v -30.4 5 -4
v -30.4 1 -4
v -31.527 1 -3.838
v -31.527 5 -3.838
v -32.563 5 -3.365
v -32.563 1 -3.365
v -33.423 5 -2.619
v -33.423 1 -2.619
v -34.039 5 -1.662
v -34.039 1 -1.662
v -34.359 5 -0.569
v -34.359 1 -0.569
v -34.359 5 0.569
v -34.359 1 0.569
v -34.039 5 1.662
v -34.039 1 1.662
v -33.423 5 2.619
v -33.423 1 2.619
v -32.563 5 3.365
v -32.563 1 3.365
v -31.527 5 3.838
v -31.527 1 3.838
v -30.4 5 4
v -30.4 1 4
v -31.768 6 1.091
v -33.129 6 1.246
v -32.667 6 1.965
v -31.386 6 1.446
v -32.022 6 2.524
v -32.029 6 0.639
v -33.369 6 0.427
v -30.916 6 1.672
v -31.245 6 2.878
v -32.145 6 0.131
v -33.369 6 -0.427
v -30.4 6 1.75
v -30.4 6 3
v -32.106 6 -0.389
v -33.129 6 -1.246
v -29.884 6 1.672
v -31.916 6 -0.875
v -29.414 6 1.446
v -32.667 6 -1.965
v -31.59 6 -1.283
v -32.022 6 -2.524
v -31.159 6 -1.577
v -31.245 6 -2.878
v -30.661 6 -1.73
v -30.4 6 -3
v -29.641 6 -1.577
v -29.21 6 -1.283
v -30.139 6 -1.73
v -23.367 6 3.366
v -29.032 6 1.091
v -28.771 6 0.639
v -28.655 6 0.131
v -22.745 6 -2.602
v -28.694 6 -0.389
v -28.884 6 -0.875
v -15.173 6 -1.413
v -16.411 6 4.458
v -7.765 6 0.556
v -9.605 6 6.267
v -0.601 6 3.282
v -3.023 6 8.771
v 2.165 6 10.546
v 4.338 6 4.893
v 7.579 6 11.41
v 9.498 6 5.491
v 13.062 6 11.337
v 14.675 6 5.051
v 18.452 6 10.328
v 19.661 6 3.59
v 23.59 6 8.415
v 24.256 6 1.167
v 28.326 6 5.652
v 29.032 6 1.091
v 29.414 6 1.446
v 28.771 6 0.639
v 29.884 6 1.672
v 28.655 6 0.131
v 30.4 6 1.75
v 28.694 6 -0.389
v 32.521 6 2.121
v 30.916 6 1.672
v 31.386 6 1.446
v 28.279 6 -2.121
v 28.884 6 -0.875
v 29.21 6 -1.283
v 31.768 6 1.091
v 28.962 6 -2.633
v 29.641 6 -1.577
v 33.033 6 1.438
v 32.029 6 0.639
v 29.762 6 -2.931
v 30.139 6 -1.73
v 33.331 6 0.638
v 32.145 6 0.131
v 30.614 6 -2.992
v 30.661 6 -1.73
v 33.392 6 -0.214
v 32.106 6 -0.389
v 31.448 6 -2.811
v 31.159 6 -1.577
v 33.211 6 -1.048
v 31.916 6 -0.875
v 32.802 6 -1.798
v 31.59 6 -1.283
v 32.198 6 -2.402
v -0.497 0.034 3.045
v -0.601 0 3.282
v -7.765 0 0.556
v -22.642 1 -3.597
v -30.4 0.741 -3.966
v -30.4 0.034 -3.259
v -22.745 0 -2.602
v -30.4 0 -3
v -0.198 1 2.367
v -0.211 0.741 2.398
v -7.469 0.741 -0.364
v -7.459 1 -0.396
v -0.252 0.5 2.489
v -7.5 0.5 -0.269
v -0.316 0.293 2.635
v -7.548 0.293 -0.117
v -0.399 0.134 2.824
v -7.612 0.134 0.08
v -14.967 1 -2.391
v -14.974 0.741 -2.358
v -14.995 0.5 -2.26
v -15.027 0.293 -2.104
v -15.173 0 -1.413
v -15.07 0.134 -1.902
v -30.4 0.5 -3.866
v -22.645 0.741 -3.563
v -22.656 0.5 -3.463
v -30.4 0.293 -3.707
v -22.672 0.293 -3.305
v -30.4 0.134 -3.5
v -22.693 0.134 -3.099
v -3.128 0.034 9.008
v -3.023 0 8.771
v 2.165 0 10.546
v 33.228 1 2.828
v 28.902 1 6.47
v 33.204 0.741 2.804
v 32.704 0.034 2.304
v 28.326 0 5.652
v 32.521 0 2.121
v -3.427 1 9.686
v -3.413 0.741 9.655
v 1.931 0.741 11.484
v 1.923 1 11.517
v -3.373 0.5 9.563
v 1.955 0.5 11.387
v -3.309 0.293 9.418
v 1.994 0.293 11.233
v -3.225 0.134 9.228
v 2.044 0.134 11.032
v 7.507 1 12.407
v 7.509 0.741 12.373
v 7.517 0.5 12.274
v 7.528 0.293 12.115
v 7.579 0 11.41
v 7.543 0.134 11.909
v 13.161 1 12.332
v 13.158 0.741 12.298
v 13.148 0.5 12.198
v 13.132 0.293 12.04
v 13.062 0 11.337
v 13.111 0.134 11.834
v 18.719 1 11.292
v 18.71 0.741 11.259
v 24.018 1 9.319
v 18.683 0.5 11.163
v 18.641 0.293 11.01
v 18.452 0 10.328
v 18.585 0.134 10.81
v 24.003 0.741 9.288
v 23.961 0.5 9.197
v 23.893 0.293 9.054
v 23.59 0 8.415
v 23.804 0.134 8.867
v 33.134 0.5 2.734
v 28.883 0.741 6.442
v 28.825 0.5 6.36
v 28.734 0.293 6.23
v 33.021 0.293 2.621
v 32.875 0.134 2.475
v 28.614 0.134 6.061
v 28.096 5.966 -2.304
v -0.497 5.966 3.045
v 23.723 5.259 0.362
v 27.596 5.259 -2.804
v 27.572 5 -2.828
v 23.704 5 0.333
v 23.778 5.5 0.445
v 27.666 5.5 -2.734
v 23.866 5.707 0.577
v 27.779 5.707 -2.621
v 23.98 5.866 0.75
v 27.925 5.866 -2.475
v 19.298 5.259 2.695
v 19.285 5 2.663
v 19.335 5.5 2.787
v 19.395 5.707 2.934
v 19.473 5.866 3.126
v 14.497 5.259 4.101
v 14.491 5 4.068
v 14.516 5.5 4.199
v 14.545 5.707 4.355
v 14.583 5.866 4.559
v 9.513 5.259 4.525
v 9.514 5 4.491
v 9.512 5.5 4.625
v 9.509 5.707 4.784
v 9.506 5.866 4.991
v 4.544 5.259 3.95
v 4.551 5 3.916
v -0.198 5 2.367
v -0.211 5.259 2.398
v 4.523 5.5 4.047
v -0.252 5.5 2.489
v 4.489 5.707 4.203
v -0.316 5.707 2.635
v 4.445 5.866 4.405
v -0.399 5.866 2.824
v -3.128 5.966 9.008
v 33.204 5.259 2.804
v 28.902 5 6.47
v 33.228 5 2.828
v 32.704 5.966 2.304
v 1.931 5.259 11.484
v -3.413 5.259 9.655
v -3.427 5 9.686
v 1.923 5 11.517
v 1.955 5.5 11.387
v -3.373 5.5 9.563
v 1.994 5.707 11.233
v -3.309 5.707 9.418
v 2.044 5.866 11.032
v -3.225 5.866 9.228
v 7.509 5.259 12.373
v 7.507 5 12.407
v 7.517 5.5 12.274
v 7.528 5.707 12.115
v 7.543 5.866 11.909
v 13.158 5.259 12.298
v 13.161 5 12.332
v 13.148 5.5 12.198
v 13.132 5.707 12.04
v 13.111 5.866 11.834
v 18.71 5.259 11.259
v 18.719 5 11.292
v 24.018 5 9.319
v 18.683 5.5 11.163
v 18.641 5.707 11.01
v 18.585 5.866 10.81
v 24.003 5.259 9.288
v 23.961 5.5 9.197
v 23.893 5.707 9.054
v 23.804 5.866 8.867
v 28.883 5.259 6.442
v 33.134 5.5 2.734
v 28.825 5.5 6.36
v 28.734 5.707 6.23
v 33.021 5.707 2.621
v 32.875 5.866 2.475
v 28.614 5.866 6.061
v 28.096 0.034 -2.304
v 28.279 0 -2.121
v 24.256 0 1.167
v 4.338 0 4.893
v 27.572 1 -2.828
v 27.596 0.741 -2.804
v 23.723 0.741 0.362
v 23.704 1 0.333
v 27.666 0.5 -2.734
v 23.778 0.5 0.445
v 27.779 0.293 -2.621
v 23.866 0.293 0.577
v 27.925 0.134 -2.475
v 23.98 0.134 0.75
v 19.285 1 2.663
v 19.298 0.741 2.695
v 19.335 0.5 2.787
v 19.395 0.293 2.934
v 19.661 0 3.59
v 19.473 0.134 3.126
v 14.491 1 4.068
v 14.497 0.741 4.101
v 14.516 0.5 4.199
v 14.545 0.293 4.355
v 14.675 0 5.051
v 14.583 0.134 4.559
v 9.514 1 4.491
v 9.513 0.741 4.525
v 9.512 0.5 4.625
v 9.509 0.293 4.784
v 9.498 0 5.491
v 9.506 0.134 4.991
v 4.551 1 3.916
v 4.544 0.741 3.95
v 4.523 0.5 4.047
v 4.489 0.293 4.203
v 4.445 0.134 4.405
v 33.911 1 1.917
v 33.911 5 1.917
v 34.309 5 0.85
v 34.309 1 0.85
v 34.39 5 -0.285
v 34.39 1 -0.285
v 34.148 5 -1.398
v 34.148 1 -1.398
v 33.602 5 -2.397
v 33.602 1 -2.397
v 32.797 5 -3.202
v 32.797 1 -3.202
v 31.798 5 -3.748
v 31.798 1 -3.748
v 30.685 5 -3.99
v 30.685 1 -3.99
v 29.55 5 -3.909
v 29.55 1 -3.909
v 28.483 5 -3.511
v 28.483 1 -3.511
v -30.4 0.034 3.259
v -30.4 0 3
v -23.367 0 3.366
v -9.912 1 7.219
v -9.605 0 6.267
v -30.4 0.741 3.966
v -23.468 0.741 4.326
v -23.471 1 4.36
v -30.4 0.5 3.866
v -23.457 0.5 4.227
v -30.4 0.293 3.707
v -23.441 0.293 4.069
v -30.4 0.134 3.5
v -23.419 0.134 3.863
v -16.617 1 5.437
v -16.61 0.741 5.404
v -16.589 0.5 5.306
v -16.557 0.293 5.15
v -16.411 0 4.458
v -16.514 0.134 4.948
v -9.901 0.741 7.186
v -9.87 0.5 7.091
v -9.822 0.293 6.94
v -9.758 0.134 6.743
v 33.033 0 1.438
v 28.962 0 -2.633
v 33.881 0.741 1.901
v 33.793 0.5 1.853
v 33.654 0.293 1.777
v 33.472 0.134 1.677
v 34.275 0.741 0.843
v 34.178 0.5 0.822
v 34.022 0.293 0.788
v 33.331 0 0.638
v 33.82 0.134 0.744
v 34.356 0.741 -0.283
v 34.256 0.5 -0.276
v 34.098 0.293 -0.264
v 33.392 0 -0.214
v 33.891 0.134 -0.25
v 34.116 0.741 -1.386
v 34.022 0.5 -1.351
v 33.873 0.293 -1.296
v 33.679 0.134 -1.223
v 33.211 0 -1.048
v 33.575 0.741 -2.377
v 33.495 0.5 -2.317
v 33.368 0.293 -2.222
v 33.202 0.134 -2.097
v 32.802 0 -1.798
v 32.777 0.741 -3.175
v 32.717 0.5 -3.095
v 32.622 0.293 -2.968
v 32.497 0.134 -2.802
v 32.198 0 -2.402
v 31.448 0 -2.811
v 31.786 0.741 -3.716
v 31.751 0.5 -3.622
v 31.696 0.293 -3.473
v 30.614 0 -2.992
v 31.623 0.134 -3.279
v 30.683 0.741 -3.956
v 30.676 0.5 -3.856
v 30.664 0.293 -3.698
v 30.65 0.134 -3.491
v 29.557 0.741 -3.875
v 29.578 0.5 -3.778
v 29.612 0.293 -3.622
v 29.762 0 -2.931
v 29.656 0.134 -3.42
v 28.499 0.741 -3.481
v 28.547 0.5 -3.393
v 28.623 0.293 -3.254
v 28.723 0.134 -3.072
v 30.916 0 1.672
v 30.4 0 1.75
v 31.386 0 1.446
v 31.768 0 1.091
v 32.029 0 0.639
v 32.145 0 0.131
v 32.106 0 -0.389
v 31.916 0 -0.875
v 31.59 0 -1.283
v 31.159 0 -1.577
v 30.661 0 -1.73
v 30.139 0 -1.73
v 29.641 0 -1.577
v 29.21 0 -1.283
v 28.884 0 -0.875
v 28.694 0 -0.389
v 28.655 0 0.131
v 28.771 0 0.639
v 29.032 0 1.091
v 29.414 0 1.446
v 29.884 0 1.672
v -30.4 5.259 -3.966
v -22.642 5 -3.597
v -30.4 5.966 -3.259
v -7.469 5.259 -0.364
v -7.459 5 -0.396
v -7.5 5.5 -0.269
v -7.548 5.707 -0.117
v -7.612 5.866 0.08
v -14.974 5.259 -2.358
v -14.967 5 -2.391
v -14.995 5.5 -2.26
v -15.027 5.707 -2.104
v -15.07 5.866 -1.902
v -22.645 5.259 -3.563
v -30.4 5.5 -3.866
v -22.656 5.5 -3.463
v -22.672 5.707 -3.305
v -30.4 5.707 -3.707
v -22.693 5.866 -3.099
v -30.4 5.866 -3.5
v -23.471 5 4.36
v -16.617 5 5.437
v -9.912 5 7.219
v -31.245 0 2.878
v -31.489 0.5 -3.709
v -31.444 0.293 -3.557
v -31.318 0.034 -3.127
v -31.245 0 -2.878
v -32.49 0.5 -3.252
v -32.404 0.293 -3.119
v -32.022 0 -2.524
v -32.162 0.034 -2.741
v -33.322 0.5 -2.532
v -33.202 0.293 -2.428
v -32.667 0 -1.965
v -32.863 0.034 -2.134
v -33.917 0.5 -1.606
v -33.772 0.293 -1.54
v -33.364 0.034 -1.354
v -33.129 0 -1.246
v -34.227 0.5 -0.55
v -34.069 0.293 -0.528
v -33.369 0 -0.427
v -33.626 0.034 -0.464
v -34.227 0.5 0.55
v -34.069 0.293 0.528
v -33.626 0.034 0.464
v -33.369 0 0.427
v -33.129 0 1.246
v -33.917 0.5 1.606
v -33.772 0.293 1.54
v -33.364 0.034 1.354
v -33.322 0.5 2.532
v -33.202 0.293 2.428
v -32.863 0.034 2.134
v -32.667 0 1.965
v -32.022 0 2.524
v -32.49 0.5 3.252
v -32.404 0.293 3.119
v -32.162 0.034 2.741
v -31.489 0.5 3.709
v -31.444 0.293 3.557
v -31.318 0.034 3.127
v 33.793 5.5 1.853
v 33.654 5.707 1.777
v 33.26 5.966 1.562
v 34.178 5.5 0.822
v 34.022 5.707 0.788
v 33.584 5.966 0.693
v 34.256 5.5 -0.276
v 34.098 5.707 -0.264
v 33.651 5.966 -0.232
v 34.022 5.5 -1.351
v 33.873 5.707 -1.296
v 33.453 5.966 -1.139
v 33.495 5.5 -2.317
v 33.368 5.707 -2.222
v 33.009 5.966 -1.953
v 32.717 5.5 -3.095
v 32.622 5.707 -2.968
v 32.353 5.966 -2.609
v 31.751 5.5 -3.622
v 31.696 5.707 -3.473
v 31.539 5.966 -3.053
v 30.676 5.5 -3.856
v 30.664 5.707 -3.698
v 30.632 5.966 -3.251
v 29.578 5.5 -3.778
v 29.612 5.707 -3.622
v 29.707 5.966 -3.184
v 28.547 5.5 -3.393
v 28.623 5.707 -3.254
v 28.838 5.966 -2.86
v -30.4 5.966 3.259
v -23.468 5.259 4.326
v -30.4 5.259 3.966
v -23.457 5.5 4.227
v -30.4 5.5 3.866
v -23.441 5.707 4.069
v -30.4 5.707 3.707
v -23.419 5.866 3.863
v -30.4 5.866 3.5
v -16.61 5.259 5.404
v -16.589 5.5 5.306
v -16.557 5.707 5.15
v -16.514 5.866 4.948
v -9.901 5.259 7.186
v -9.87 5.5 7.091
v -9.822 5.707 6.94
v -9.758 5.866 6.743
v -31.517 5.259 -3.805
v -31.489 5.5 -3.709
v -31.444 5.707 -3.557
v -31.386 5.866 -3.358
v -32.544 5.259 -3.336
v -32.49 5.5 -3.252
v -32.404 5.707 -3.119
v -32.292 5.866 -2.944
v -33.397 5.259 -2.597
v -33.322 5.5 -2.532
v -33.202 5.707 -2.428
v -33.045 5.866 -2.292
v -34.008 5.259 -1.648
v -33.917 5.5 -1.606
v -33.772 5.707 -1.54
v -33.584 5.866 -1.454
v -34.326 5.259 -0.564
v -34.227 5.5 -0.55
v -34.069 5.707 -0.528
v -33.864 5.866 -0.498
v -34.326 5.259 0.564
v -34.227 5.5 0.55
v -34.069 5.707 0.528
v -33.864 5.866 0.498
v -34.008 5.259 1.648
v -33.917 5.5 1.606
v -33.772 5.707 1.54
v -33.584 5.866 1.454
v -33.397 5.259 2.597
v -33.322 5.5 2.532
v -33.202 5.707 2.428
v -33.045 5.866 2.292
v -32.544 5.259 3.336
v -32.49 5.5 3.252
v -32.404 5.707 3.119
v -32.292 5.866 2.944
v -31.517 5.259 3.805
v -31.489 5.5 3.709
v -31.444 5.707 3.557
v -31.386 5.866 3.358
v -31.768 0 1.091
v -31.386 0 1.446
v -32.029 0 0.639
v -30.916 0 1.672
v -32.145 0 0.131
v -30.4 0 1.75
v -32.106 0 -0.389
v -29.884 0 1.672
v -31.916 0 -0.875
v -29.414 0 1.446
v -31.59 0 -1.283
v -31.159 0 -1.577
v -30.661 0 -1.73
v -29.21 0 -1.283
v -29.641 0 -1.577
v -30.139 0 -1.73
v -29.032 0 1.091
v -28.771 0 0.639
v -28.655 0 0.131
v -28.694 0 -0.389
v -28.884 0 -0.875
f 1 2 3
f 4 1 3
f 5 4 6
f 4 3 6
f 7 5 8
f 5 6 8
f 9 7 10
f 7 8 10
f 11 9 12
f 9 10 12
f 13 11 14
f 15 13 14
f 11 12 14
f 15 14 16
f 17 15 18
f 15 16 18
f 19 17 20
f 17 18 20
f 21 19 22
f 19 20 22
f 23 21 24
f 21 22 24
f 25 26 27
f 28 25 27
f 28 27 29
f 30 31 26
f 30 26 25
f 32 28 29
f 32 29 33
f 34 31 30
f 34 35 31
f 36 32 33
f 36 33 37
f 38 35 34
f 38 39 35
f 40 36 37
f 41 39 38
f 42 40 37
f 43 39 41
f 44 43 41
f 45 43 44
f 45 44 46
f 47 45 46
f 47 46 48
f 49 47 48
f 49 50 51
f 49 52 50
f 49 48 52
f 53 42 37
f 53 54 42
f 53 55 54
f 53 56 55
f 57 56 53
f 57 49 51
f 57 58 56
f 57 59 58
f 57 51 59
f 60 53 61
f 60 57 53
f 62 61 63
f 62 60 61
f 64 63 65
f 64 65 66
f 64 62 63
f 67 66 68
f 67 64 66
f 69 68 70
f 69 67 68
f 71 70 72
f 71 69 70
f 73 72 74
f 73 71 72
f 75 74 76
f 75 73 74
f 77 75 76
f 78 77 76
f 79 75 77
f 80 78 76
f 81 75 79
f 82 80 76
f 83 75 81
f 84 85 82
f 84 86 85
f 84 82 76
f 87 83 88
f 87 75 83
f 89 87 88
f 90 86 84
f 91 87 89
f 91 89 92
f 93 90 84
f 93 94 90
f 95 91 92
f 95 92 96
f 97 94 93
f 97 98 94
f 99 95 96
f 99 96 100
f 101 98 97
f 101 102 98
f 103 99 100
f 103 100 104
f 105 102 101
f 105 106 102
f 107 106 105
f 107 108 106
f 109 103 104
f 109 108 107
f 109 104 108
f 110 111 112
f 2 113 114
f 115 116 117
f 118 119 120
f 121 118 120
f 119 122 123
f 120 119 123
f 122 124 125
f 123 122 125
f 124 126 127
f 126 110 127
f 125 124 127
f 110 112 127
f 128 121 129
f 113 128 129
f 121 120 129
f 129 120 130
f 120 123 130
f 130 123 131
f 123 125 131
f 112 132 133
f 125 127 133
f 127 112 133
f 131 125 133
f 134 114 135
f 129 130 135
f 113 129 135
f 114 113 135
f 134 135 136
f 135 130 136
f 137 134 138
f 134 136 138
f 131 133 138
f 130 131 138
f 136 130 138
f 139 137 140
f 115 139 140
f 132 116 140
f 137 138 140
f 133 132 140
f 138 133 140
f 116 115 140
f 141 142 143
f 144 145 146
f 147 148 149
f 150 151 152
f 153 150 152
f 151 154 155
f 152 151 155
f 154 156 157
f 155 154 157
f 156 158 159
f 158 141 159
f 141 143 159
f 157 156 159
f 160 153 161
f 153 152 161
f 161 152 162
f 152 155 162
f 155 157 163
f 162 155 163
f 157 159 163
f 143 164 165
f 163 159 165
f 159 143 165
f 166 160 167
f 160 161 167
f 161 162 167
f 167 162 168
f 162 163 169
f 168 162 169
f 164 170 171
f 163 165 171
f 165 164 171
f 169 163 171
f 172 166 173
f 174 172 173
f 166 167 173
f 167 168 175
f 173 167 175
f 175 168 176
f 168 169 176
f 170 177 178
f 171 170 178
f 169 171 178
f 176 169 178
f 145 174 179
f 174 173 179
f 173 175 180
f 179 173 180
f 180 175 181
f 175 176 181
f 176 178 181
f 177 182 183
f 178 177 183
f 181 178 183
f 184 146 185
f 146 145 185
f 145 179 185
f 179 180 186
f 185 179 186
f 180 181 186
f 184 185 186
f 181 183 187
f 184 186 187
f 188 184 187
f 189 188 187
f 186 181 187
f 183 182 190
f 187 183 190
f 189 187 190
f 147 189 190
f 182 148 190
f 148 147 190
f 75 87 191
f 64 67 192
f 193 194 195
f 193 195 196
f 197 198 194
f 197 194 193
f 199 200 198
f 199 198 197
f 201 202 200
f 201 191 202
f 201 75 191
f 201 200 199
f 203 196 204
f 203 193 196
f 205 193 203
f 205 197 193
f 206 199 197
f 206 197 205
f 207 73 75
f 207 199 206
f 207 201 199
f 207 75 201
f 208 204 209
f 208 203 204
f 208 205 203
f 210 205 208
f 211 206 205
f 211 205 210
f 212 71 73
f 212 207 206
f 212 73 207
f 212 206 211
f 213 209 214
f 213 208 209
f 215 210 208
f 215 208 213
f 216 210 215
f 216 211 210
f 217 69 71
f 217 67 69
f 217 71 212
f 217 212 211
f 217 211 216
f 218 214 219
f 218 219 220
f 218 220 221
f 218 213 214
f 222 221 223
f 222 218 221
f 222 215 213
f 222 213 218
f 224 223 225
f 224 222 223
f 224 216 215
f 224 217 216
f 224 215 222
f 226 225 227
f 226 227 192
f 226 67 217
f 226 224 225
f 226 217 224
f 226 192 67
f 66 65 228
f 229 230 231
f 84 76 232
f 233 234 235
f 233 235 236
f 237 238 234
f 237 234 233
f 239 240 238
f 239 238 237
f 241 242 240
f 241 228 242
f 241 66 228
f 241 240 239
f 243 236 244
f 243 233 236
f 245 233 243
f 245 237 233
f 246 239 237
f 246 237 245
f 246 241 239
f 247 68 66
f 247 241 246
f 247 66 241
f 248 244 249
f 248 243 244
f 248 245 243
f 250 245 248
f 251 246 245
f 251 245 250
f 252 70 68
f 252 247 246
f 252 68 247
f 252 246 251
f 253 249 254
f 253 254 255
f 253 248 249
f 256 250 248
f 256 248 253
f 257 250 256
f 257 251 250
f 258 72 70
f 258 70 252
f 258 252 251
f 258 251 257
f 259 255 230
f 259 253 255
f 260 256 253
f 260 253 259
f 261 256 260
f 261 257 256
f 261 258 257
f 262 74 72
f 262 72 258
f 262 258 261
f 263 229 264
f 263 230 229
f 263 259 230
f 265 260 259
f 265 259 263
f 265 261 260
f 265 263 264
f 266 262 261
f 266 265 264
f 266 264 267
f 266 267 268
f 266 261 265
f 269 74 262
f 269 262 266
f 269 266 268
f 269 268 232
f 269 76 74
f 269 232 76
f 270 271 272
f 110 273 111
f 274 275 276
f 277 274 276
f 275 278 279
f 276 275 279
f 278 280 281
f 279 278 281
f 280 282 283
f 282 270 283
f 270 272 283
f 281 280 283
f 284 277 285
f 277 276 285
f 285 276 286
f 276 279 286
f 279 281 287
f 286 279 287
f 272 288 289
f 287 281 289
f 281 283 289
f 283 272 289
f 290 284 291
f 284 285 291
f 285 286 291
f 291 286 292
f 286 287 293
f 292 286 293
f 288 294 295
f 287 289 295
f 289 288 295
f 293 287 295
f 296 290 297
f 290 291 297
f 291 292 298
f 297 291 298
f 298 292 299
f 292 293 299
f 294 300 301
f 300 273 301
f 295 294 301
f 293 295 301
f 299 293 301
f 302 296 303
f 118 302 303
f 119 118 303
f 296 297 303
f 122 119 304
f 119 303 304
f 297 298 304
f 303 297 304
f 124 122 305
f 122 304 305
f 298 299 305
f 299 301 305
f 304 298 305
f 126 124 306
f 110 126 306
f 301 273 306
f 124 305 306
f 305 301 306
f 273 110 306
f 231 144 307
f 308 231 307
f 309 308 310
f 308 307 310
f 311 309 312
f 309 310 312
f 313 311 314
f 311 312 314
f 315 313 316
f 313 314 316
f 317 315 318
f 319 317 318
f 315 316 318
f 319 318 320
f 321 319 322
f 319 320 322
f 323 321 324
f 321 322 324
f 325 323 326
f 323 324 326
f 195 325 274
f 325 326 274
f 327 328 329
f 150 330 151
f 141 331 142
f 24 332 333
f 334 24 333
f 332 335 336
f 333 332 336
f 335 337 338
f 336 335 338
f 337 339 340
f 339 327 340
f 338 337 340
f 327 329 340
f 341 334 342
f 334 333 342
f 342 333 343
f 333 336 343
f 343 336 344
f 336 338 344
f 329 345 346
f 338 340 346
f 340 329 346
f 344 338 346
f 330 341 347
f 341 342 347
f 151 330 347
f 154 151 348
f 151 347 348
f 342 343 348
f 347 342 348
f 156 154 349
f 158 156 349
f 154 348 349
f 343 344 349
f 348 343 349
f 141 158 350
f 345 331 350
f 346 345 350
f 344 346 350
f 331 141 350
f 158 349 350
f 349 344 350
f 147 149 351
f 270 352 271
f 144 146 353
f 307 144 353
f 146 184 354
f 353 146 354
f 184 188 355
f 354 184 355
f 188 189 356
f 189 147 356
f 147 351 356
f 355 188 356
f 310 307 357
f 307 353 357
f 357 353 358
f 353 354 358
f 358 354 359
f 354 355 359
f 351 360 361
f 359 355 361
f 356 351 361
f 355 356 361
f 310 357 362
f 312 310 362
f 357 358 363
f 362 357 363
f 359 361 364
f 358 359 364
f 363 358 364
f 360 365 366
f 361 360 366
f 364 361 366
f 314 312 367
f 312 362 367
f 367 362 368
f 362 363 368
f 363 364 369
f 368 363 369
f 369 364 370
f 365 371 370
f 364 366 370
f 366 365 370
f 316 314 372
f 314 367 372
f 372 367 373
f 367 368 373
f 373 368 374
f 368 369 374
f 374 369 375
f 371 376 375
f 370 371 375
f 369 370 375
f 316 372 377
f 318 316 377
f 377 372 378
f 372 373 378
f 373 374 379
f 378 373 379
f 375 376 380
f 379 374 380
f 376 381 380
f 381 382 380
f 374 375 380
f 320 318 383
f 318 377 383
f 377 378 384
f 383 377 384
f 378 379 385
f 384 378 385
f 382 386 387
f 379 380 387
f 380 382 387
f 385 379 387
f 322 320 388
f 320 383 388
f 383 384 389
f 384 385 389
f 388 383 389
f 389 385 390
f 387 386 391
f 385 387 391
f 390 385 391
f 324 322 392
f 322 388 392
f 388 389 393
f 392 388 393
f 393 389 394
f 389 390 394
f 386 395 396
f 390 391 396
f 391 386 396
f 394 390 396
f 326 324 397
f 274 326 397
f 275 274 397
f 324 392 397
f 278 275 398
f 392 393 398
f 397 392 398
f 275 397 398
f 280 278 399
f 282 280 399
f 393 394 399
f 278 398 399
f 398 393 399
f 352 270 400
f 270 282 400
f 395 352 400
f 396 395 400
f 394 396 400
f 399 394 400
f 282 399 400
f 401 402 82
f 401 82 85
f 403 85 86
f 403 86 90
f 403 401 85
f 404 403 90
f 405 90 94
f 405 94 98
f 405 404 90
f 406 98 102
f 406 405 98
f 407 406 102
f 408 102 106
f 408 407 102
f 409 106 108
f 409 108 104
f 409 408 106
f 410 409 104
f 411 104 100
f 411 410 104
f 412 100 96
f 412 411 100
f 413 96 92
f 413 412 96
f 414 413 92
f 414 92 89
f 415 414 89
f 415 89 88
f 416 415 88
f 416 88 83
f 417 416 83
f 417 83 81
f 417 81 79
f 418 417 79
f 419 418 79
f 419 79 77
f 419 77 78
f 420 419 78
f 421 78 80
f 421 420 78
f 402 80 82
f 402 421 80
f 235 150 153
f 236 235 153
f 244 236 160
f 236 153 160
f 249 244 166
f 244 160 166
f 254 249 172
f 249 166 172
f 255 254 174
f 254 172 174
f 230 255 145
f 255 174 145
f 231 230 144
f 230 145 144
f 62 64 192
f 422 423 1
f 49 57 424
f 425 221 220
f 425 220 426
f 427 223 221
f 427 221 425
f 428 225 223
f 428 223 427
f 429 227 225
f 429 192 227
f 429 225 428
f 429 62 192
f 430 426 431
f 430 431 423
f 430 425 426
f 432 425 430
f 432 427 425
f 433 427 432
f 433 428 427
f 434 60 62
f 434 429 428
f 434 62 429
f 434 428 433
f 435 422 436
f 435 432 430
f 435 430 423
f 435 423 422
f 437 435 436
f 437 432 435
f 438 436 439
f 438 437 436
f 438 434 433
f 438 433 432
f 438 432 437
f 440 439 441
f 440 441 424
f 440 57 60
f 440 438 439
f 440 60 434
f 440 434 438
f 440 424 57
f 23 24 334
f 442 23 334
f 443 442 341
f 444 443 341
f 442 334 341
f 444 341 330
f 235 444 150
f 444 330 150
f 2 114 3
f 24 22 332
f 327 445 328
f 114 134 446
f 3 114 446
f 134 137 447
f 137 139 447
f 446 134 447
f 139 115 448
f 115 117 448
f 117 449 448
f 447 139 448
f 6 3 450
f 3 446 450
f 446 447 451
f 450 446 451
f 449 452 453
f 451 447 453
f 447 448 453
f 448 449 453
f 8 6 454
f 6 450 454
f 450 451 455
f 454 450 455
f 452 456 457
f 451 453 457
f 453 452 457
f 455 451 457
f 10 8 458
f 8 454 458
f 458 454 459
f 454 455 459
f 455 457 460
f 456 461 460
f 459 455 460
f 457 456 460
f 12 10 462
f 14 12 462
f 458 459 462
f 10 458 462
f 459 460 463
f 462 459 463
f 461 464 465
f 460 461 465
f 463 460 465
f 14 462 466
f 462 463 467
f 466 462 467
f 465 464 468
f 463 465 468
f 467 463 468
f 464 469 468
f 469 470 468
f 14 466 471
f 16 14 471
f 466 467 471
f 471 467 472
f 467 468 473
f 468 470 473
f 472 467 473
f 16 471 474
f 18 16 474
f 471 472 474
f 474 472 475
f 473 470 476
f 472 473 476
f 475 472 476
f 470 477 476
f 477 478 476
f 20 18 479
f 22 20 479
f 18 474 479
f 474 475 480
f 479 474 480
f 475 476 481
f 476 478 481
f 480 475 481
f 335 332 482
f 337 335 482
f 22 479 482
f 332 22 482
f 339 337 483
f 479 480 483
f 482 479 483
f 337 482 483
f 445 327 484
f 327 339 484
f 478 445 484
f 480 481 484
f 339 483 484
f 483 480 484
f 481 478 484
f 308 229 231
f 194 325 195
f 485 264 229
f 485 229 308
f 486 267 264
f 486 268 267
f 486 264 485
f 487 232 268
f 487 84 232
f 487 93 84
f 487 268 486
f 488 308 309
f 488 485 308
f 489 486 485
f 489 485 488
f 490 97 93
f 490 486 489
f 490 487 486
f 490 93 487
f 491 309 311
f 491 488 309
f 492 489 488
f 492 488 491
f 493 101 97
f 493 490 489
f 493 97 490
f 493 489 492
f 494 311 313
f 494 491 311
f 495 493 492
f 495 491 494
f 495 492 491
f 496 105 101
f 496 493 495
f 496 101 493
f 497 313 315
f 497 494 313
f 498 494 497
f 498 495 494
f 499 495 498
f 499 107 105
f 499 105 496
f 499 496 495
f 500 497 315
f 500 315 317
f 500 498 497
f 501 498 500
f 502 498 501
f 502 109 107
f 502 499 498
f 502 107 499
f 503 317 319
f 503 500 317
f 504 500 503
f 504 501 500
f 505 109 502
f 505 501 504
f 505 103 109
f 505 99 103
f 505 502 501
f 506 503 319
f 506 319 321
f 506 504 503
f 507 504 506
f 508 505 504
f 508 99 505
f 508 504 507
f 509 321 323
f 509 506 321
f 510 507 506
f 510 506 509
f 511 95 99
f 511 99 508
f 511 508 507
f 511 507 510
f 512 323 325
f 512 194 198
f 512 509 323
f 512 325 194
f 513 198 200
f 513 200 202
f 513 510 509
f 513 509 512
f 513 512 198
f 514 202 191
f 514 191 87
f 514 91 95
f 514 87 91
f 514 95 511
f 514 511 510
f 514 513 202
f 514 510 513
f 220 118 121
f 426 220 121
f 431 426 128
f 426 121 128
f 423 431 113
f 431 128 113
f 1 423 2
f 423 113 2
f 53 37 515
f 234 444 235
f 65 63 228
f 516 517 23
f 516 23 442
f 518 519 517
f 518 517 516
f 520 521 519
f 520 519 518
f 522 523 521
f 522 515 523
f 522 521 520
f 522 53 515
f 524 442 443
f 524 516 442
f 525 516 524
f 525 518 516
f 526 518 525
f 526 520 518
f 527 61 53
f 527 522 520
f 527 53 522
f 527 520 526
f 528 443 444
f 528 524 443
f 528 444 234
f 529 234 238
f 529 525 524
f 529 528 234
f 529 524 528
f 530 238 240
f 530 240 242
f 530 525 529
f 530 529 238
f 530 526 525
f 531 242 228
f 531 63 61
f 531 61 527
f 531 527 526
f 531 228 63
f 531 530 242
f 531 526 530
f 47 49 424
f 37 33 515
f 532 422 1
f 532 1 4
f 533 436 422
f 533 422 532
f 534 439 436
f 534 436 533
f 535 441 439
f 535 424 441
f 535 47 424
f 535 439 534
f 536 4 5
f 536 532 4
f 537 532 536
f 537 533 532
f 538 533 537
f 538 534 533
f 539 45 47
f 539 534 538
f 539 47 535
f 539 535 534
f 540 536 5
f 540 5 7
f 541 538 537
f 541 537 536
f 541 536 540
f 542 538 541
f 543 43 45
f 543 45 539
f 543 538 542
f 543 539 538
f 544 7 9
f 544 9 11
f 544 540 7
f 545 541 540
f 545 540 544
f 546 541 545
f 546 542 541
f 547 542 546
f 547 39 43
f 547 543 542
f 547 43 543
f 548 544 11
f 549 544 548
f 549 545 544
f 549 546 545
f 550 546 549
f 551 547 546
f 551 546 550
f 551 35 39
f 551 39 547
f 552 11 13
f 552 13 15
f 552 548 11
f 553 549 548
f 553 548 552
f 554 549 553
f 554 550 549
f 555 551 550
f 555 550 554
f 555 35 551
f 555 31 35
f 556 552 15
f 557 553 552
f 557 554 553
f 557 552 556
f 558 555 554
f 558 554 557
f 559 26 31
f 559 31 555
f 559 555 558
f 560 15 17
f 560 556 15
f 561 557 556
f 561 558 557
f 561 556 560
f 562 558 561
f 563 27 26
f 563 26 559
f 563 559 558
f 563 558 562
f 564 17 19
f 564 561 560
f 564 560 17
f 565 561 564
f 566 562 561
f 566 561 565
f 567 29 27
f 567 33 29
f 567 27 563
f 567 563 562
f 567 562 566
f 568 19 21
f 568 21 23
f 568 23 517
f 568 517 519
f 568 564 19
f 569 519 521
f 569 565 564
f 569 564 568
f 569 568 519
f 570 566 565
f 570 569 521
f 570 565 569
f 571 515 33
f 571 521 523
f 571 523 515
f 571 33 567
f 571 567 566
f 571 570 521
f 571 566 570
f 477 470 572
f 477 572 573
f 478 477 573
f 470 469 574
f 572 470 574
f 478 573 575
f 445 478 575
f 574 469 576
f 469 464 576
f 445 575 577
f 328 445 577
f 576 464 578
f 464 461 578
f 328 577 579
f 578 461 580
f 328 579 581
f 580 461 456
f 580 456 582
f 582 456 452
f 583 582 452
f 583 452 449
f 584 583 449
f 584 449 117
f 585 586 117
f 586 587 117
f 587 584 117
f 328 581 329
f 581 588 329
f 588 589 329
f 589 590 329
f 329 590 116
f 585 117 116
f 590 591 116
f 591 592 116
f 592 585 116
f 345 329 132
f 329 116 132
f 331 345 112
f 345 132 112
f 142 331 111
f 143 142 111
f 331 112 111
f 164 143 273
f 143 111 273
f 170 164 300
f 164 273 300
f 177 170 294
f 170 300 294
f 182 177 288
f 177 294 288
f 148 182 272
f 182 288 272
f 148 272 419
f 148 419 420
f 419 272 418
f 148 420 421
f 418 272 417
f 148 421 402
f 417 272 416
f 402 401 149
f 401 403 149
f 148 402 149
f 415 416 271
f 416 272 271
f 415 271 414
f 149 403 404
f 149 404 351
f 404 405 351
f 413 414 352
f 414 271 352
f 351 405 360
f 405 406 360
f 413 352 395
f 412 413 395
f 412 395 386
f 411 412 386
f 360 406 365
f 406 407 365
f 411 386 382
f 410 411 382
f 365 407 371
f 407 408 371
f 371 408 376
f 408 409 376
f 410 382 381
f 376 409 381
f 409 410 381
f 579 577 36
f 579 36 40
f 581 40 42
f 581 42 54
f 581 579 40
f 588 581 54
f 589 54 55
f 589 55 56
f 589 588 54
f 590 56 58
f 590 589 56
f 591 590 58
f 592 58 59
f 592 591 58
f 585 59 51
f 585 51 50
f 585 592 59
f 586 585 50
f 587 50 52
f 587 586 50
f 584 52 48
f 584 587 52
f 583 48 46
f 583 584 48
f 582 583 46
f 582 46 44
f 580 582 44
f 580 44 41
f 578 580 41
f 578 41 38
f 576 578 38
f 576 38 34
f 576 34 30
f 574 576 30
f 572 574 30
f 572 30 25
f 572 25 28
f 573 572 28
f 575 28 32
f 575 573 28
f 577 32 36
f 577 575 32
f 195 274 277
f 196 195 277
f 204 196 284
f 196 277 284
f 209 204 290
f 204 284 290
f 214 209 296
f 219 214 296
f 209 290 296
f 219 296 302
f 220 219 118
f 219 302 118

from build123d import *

# Parameters (mm, degrees)
SKETCH1_R           = 1.75
BOSS_EXTRUDE1_DEPTH = 6
FILLET1_R           = 1


with BuildPart() as part:
    # Sketch1 → Boss-Extrude1 (new body)
    with BuildSketch(Plane(origin=(0, 0, 0), x_dir=(1, 0, 0), z_dir=(0, 1, 0))):
        with BuildLine():
            ThreePointArc((-30.4, 4), (-34.4, 0), (-30.4, -4))
            ThreePointArc((-30.4, -4), (-16.617055958, -5.436924168), (-3.426888285, -9.685897488))
            ThreePointArc((-3.426888285, -9.685897488), (15.962258381, -11.93115149), (33.228427125, -2.828427125))
            ThreePointArc((33.228427125, -2.828427125), (33.228427125, 2.828427125), (27.571572875, 2.828427125))
            ThreePointArc((27.571572875, 2.828427125), (14.491142009, -4.067576182), (-0.197605466, -2.366626181))
            ThreePointArc((-0.197605466, -2.366626181), (-14.966930275, 2.391043974), (-30.4, 4))
        make_face()
        with Locations(Location((-30.4, 0, 0), (0, 0, 270))):
            Circle(SKETCH1_R, mode=Mode.SUBTRACT)
        with Locations(Location((30.4, 0, 0), (0, 0, 270))):
            Circle(SKETCH1_R, mode=Mode.SUBTRACT)
    extrude(amount=BOSS_EXTRUDE1_DEPTH)

    # Fillet1
    fillet1_edges = [part.edges().sort_by_distance(p)[0] for p in [
        (-16.617055958, 6, 5.436924168),
        (15.962258381, 6, 11.93115149),
        (33.228427125, 6, -2.828427125),
        (14.491142009, 6, 4.067576182),
        (-14.966930275, 6, -2.391043974),
        (14.491142009, 0, 4.067576182),
        (33.228427125, 0, -2.828427125),
        (15.962258381, 0, 11.93115149),
        (-16.617055958, 0, 5.436924168),
        (-34.4, 0, 0),
        (-14.966930275, 0, -2.391043974),
        (-34.4, 6, 0),
    ]]
    fillet(fillet1_edges, radius=FILLET1_R)


solid = part.part
